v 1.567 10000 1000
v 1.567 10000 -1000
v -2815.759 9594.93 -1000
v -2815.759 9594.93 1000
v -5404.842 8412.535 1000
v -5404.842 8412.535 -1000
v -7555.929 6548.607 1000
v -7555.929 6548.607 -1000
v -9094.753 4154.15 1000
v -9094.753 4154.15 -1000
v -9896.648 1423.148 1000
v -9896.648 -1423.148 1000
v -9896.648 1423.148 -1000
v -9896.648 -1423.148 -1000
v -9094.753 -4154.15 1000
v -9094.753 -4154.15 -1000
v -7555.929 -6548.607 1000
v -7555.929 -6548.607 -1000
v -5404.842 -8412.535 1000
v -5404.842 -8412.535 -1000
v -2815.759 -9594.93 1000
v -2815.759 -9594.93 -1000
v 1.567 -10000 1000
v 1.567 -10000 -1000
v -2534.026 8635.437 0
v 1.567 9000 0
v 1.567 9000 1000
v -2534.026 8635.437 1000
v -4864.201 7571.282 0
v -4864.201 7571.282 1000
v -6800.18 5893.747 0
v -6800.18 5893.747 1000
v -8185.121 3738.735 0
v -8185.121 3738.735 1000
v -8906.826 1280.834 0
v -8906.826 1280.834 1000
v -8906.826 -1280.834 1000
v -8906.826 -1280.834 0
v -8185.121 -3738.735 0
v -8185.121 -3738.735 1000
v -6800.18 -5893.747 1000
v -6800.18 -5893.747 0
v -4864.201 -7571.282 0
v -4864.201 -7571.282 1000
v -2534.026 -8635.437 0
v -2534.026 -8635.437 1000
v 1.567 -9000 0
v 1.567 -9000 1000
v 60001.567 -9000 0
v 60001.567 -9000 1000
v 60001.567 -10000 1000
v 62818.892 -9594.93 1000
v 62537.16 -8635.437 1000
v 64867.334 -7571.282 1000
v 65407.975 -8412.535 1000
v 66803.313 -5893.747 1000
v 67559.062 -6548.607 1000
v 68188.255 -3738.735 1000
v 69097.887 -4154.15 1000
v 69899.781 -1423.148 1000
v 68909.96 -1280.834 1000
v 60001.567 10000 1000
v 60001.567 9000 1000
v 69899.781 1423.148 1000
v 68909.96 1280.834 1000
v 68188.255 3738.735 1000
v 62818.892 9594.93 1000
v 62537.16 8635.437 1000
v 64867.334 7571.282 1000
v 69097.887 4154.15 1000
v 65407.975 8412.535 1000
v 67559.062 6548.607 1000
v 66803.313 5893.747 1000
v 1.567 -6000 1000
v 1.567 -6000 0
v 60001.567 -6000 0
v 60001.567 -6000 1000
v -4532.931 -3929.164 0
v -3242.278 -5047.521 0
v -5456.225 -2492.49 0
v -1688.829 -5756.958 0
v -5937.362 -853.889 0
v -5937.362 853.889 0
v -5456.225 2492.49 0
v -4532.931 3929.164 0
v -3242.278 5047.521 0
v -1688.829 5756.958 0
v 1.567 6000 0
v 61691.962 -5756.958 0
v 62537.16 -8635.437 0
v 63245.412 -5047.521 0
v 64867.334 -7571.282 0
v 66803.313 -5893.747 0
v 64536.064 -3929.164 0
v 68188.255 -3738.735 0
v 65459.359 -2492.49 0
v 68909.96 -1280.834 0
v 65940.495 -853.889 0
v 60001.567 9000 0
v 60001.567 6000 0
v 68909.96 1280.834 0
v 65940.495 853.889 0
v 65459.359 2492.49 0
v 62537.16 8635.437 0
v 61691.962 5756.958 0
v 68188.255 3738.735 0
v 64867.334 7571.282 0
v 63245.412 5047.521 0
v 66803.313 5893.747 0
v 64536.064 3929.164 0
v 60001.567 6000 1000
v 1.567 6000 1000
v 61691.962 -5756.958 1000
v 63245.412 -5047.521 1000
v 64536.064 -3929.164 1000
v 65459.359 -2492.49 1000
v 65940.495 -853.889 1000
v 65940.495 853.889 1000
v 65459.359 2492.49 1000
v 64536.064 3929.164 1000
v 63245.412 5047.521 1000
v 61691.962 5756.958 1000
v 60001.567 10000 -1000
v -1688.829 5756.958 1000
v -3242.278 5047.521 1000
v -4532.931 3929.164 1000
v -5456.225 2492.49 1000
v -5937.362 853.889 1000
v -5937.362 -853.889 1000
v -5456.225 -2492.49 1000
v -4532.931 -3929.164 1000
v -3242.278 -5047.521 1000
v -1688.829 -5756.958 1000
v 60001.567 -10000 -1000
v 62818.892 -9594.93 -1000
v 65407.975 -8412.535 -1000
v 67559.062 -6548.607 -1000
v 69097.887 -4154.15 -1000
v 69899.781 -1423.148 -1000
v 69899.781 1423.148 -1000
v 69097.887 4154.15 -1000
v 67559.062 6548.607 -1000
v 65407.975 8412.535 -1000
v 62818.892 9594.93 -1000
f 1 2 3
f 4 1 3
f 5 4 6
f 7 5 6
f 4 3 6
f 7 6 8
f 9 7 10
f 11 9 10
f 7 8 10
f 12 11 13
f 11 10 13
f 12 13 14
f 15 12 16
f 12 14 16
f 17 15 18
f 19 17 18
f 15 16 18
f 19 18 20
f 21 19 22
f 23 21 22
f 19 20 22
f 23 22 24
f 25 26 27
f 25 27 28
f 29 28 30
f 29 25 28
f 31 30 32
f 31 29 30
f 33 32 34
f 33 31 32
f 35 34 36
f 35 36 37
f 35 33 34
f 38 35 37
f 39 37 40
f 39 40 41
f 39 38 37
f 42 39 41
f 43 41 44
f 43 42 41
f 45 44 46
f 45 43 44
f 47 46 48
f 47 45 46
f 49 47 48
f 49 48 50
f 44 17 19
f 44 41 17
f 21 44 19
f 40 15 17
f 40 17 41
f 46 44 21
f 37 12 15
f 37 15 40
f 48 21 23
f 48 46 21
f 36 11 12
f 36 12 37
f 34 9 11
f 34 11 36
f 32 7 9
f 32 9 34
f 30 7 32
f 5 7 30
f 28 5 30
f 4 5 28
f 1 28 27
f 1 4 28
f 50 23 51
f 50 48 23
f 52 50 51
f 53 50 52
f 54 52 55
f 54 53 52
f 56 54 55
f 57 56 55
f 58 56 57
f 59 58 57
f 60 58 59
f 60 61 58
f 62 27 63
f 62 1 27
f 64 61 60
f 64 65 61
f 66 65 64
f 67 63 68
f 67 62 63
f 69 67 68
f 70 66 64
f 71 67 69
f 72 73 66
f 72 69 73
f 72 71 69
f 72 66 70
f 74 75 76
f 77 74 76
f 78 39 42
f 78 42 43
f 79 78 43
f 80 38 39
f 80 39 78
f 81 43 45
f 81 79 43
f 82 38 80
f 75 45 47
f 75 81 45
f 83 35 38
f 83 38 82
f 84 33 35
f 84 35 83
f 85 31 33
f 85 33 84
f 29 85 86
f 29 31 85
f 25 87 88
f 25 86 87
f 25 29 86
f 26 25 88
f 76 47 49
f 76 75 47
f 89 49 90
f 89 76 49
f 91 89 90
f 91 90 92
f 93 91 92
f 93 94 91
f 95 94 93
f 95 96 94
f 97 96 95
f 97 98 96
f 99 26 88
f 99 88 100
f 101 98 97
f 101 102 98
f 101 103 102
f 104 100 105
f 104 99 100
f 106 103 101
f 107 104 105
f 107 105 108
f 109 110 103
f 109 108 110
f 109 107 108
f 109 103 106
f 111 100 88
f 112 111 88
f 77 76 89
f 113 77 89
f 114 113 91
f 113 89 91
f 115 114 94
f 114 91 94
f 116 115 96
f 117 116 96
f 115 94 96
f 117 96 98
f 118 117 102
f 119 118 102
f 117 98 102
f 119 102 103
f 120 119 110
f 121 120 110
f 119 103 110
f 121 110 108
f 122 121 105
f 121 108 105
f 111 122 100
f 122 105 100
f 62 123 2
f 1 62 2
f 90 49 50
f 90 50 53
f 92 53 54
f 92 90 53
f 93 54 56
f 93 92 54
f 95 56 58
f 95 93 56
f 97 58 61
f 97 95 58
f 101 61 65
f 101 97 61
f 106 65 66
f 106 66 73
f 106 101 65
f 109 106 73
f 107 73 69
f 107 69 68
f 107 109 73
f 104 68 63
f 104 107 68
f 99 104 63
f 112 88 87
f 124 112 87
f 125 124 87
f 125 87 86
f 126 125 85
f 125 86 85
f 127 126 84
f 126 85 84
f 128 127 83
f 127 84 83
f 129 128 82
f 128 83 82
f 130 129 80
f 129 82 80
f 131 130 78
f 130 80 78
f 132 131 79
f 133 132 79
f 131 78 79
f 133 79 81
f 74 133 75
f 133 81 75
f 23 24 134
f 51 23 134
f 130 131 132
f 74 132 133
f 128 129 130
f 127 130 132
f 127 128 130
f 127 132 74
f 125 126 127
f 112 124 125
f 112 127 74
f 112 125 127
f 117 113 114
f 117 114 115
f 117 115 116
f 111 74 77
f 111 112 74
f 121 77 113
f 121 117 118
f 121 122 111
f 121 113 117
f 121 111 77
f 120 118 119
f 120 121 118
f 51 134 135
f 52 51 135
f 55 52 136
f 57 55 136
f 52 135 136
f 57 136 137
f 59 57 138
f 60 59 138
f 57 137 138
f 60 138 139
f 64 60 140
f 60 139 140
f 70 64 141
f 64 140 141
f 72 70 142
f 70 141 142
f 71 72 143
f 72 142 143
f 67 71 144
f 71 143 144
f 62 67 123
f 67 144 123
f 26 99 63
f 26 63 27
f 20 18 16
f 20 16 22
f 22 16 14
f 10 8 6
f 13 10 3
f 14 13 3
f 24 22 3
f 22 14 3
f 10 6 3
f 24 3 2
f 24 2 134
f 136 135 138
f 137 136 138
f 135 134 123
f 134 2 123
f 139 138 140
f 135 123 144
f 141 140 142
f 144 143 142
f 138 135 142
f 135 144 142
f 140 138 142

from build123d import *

# Parameters (mm, degrees)
EXTRUDE_1_DEPTH   = 1000
EXTRUDE_1_2_DEPTH = 1000
EXTRUDE_START     = -1000
EXTRUDE_2_DEPTH   = 1000


with BuildPart() as part:
    # ｽｹｯﾁ1 → ﾎﾞｽ - 押し出し1 (new body)
    with BuildSketch(Plane.XY):
        with BuildLine():
            Line((60001.566621315, 10000), (1.566621315, 10000))
            ThreePointArc((1.566621315, 10000), (-9998.433378685, 0), (1.566621315, -10000))
            Line((1.566621315, -10000), (60001.566621315, -10000))
            ThreePointArc((60001.566621315, -10000), (70001.566621315, 0), (60001.566621315, 10000))
        make_face()
        with BuildLine():
            ThreePointArc((1.566621315, -9000), (-8998.433378685, 0), (1.566621315, 9000))
            Line((1.566621315, 9000), (60001.566621315, 9000))
            ThreePointArc((60001.566621315, 9000), (69001.566621315, 0), (60001.566621315, -9000))
            Line((60001.566621315, -9000), (1.566621315, -9000))
        make_face(mode=Mode.SUBTRACT)
    extrude(amount=EXTRUDE_1_DEPTH)



with BuildPart() as body_2:
    # ｽｹｯﾁ1 → Extrude 1 2 (new body)
    with BuildSketch(Plane.XY):
        with BuildLine():
            Line((60001.566621315, 6000), (1.566621315, 6000))
            ThreePointArc((1.566621315, 6000), (-5998.433378685, 0), (1.566621315, -6000))
            Line((1.566621315, -6000), (60001.566621315, -6000))
            ThreePointArc((60001.566621315, -6000), (66001.566621315, 0), (60001.566621315, 6000))
        make_face()
    extrude(amount=EXTRUDE_1_2_DEPTH)


with BuildPart() as part_1:
    add(part.part)

    add(body_2.part)  # ﾎﾞｽ - 押し出し2 merges body 2
    # ｽｹｯﾁ1<3> → ﾎﾞｽ - 押し出し2 (add)
    with BuildSketch(Plane.XY.offset(EXTRUDE_START)):
        with BuildLine():
            Line((60001.566621315, 10000), (1.566621315, 10000))
            ThreePointArc((1.566621315, 10000), (-9998.433378685, 0), (1.566621315, -10000))
            Line((1.566621315, -10000), (60001.566621315, -10000))
            ThreePointArc((60001.566621315, -10000), (70001.566621315, 0), (60001.566621315, 10000))
        make_face()
    extrude(amount=EXTRUDE_2_DEPTH)


solid = part_1.part
